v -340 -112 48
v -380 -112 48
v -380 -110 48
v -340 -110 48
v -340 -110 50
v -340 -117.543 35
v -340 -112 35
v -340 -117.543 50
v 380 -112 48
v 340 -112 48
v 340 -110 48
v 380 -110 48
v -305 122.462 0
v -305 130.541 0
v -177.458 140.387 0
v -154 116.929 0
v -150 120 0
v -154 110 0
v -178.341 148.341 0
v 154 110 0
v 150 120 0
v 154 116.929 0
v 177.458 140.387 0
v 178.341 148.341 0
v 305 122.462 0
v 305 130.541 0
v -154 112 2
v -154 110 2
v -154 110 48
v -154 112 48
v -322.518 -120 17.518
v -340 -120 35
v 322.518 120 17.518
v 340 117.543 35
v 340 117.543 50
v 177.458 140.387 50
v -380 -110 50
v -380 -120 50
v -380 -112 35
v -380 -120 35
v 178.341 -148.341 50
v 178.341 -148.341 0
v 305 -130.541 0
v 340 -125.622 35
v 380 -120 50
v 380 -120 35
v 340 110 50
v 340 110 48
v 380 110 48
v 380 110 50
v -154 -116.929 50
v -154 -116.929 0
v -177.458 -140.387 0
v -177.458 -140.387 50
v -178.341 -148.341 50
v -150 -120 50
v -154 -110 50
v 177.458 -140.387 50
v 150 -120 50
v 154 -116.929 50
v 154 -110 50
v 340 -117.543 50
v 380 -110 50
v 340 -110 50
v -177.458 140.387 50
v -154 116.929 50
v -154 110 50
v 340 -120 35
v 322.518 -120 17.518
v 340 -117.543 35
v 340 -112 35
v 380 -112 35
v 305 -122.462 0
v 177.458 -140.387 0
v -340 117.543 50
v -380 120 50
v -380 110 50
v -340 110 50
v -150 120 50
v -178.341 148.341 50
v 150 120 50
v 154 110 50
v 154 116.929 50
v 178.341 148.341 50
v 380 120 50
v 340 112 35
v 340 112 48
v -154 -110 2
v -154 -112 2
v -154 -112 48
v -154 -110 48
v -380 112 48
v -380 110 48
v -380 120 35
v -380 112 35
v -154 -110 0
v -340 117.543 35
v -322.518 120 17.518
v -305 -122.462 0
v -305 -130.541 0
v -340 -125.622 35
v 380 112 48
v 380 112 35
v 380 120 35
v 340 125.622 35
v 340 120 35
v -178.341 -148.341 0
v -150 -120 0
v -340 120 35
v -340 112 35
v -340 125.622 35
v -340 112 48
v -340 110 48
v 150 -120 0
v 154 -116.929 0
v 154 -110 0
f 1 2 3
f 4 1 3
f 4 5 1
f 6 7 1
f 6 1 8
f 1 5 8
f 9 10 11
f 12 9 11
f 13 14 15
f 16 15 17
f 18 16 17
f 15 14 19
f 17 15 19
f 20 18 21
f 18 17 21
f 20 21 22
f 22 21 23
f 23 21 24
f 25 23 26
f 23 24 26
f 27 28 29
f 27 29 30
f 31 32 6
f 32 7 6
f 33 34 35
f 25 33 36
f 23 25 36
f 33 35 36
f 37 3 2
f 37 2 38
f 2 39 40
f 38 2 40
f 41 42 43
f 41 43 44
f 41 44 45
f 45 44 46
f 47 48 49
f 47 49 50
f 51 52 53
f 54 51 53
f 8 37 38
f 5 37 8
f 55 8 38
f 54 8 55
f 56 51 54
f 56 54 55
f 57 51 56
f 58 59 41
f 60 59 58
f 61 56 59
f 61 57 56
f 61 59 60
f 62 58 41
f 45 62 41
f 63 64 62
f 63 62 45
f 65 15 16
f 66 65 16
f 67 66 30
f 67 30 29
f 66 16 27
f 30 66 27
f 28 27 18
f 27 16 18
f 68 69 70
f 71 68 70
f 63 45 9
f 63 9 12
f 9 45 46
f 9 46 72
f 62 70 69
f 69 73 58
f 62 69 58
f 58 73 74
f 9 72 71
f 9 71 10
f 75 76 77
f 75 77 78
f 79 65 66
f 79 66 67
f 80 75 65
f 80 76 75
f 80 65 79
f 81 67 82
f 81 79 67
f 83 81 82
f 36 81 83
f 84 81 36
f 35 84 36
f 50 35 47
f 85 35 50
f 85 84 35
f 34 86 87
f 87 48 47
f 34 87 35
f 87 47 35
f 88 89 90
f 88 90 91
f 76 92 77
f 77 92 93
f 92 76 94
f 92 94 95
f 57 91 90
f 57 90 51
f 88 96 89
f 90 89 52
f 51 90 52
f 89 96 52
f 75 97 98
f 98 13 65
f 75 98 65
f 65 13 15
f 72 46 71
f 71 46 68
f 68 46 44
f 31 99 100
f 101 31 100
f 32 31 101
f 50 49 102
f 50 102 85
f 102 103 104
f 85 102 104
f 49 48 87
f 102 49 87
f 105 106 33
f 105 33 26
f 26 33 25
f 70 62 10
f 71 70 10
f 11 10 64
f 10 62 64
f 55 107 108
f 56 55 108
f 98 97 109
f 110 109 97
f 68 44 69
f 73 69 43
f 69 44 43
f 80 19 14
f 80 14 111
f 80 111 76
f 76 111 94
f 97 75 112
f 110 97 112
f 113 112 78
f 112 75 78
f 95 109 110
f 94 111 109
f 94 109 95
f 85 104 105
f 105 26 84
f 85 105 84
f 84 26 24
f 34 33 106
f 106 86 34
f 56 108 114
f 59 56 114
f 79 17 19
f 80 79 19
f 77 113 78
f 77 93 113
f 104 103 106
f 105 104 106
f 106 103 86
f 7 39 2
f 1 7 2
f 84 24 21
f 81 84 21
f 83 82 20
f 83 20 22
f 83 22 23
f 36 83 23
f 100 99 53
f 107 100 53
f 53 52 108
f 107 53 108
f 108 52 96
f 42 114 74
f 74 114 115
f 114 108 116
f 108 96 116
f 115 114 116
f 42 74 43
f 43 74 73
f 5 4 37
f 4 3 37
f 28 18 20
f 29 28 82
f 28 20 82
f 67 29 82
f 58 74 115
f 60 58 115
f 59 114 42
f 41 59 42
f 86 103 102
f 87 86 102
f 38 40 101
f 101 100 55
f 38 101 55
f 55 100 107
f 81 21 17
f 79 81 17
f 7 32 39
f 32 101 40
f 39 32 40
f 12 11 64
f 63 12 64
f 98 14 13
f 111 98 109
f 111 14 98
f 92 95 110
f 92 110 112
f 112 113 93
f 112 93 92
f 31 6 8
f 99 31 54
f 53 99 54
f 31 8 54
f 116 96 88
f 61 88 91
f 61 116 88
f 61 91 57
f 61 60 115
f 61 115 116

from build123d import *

# Parameters (mm, degrees)
F1_DEPTH  = 50
F3_W      = 220
F3_H      = 40
F4_DEPTH  = 760
F5_DEPTH  = 240
F6_W      = 319.9999928474
F6_H      = 220
F6_W_2    = 280
F6_H_2    = 180
F7_DEPTH  = 50
F8_DEPTH  = 435.9292732552
F9_W      = 140
F9_H      = 220
F10_DEPTH = 10
F12_DEPTH = 240
F13_DEPTH = 25
F14_DEPTH = 25
F16_W     = 220
F16_H     = 40
F17_DEPTH = 5
F15_W     = 220
F15_H     = 40
F18_DEPTH = 5
F19_DEPTH = 121.5992048383
F20_DEPTH = 1432.7406287193
F21_DEPTH = 794.6060718969
F22_DEPTH = 848.3018605039
F24_DEPTH = 50
F25_DEPTH = 50
F27_DEPTH = 50
F28_W     = 2
F28_H     = 46
F29_DEPTH = 777.0212888718
F30_DEPTH = 308


with BuildPart() as f1:
    # F0 (on Top) → F1 (new body)
    with BuildSketch(Plane.XY):
        Polygon((-178.3412894642, 148.3412835037), (-380, 120), (-380, -120), (-178.3412894642, -148.3412835037), (-150.0000059605, -120), (150.0000059605, -120), (178.3412894642, -148.3412835037), (380, -120), (380, 120), (178.3412894642, 148.3412835037), (150.0000059605, 120), (-150.0000059605, 120), align=None)
    extrude(amount=F1_DEPTH)

    # F3 (on face) → F4 (cut)
    with BuildSketch(Plane(origin=(-380, 0, 0), x_dir=(0, -1, 0), z_dir=(-1, 0, 0))):
        with Locations((0, 25)):
            Rectangle(F3_W, F3_H)
    extrude(amount=-F4_DEPTH, mode=Mode.SUBTRACT)

    # F2 (on face) → F5 (cut)
    with BuildSketch(Plane.XZ.offset(120)):
        Polygon((305, 0), (380, 0), (380, 35), (340, 35), align=None)
        Polygon((-340, 35), (-380, 35), (-380, 0), (-305, 0), align=None)
    extrude(amount=-F5_DEPTH, mode=Mode.SUBTRACT)

    # F6 (on face) → F7 (cut)
    with BuildSketch(Plane.XY.offset(50)):
        Rectangle(F6_W, F6_H)
        Rectangle(F6_W_2, F6_H_2, mode=Mode.SUBTRACT)
    extrude(amount=-F7_DEPTH, mode=Mode.SUBTRACT)

    # F2 (on face) → F8 (cut, symmetric)
    with BuildSketch(Plane.XZ.offset(120)):
        Polygon((-340, 35), (-380, 35), (-380, 0), (-305, 0), align=None)
        Polygon((305, 0), (380, 0), (380, 35), (340, 35), align=None)
    extrude(amount=F8_DEPTH, both=True, mode=Mode.SUBTRACT)

    # F9 (on face) → F10 (cut)
    with BuildSketch(Plane.XY.offset(50)):
        with Locations((-234.9999964237, 0)):
            Rectangle(F9_W, F9_H)
        with Locations((234.9999964237, 0)):
            Rectangle(F9_W, F9_H)
    extrude(amount=-F10_DEPTH, mode=Mode.SUBTRACT)

    # F11 (on face) → F12 (join)
    with BuildSketch(Plane.XZ.offset(120)):
        Polygon((-305.0000059605, 0), (-305.0000059605, 7.0710678119), (-332.9289381486, 35), (-340.0000059605, 35), align=None)
        Polygon((340.0000059605, 35), (332.9289381486, 35), (305.0000059605, 7.0710678119), (305.0000059605, 0), align=None)
    extrude(amount=-F12_DEPTH)

    # F13 (cut): a face of the model
    f13_faces = [f1.faces().sort_by_distance(p)[0] for p in [
        (0, 0, 50),
    ]]
    extrude(f13_faces, amount=-F13_DEPTH, mode=Mode.SUBTRACT)

    # F14 (cut): a face of the model
    f14_faces = [f1.faces().sort_by_distance(p)[0] for p in [
        (0, 0, 0),
    ]]
    extrude(f14_faces, amount=-F14_DEPTH, mode=Mode.SUBTRACT)

    # F16 (on face) → F17 (join)
    with BuildSketch(Plane.YZ.offset(-159.9999964237)):
        with Locations((0, 25)):
            Rectangle(F16_W, F16_H)
    extrude(amount=-F17_DEPTH)

    # F15 (on face) → F18 (join)
    with BuildSketch(Plane(origin=(159.9999964237, 0, 0), x_dir=(0, -1, 0), z_dir=(-1, 0, 0))):
        with Locations((0, 25)):
            Rectangle(F15_W, F15_H)
    extrude(amount=-F18_DEPTH)

    # F19 (cut): a face of the model
    f19_faces = [f1.faces().sort_by_distance(p)[0] for p in [
        (-304.9999964237, 0, 47.5),
    ]]
    extrude(f19_faces, amount=-F19_DEPTH, mode=Mode.SUBTRACT)

    # F20 (cut, symmetric): a face of the model
    f20_faces = [f1.faces().sort_by_distance(p)[0] for p in [
        (304.9999964237, 0, 47.5),
    ]]
    extrude(f20_faces, amount=F20_DEPTH, both=True, mode=Mode.SUBTRACT)

    # F21 (cut, symmetric): a face of the model
    f21_faces = [f1.faces().sort_by_distance(p)[0] for p in [
        (-164.9999964237, 0, 25),
    ]]
    extrude(f21_faces, amount=F21_DEPTH, both=True, mode=Mode.SUBTRACT)

    # F22 (cut, symmetric): a face of the model
    f22_faces = [f1.faces().sort_by_distance(p)[0] for p in [
        (-159.9999964237, 0, 2.5),
    ]]
    extrude(f22_faces, amount=F22_DEPTH, both=True, mode=Mode.SUBTRACT)

    # F23 (on face) → F24 (cut)
    with BuildSketch(Plane(origin=(0, 0, 0), x_dir=(1, 0, 0), z_dir=(0, 0, -1))):
        Polygon((-154.0000059605, -110), (-301, -110), (-301, -123.0241053613), (-177.4578903454, -140.3868165731), (-154.0000059605, -116.9289321881), align=None)
        Polygon((301, -123.0241053613), (301, -110), (154.0000059605, -110), (154.0000059605, -116.9289321881), (177.4578903454, -140.3868165731), align=None)
    extrude(amount=-F24_DEPTH, mode=Mode.SUBTRACT)

    # F23 (on face) → F25 (cut)
    with BuildSketch(Plane(origin=(0, 0, 0), x_dir=(1, 0, 0), z_dir=(0, 0, -1))):
        Polygon((-301, 123.0241053613), (-301, 110), (-154.0000059605, 110), (-154.0000059605, 116.9289321881), (-177.4578903454, 140.3868165731), align=None)
        Polygon((154.0000059605, 116.9289321881), (154.0000059605, 110), (301, 110), (301, 123.0241053613), (177.4578903454, 140.3868165731), align=None)
    extrude(amount=-F25_DEPTH, mode=Mode.SUBTRACT)

    # F26 (on face) → F27 (cut)
    with BuildSketch(Plane.XY.offset(50)):
        Polygon((301, -110), (301, -123.0241053613), (340, -117.5430128079), (340, -110), align=None)
        Polygon((-301, -123.0241053613), (-301, -110), (-340, -110), (-340, -117.5430128079), align=None)
        Polygon((301, 110), (340, 110), (340, 117.5430128079), (301, 123.0241053613), align=None)
        Polygon((-340, 110), (-301, 110), (-301, 123.0241053613), (-340, 117.5430128079), align=None)
    extrude(amount=-F27_DEPTH, mode=Mode.SUBTRACT)

    # F28 (on face) → F29 (cut, symmetric)
    with BuildSketch(Plane.YZ.offset(154.0000059605)):
        with Locations((-111, 25)):
            Rectangle(F28_W, F28_H)
        with Locations((111, 25)):
            Rectangle(F28_W, F28_H)
    extrude(amount=F29_DEPTH, both=True, mode=Mode.SUBTRACT)

    # F28 (on face) → F30 (join)
    with BuildSketch(Plane.YZ.offset(154.0000059605)):
        with Locations((-111, 25)):
            Rectangle(F28_W, F28_H)
        with Locations((111, 25)):
            Rectangle(F28_W, F28_H)
    extrude(amount=-F30_DEPTH)


solid = f1.part
